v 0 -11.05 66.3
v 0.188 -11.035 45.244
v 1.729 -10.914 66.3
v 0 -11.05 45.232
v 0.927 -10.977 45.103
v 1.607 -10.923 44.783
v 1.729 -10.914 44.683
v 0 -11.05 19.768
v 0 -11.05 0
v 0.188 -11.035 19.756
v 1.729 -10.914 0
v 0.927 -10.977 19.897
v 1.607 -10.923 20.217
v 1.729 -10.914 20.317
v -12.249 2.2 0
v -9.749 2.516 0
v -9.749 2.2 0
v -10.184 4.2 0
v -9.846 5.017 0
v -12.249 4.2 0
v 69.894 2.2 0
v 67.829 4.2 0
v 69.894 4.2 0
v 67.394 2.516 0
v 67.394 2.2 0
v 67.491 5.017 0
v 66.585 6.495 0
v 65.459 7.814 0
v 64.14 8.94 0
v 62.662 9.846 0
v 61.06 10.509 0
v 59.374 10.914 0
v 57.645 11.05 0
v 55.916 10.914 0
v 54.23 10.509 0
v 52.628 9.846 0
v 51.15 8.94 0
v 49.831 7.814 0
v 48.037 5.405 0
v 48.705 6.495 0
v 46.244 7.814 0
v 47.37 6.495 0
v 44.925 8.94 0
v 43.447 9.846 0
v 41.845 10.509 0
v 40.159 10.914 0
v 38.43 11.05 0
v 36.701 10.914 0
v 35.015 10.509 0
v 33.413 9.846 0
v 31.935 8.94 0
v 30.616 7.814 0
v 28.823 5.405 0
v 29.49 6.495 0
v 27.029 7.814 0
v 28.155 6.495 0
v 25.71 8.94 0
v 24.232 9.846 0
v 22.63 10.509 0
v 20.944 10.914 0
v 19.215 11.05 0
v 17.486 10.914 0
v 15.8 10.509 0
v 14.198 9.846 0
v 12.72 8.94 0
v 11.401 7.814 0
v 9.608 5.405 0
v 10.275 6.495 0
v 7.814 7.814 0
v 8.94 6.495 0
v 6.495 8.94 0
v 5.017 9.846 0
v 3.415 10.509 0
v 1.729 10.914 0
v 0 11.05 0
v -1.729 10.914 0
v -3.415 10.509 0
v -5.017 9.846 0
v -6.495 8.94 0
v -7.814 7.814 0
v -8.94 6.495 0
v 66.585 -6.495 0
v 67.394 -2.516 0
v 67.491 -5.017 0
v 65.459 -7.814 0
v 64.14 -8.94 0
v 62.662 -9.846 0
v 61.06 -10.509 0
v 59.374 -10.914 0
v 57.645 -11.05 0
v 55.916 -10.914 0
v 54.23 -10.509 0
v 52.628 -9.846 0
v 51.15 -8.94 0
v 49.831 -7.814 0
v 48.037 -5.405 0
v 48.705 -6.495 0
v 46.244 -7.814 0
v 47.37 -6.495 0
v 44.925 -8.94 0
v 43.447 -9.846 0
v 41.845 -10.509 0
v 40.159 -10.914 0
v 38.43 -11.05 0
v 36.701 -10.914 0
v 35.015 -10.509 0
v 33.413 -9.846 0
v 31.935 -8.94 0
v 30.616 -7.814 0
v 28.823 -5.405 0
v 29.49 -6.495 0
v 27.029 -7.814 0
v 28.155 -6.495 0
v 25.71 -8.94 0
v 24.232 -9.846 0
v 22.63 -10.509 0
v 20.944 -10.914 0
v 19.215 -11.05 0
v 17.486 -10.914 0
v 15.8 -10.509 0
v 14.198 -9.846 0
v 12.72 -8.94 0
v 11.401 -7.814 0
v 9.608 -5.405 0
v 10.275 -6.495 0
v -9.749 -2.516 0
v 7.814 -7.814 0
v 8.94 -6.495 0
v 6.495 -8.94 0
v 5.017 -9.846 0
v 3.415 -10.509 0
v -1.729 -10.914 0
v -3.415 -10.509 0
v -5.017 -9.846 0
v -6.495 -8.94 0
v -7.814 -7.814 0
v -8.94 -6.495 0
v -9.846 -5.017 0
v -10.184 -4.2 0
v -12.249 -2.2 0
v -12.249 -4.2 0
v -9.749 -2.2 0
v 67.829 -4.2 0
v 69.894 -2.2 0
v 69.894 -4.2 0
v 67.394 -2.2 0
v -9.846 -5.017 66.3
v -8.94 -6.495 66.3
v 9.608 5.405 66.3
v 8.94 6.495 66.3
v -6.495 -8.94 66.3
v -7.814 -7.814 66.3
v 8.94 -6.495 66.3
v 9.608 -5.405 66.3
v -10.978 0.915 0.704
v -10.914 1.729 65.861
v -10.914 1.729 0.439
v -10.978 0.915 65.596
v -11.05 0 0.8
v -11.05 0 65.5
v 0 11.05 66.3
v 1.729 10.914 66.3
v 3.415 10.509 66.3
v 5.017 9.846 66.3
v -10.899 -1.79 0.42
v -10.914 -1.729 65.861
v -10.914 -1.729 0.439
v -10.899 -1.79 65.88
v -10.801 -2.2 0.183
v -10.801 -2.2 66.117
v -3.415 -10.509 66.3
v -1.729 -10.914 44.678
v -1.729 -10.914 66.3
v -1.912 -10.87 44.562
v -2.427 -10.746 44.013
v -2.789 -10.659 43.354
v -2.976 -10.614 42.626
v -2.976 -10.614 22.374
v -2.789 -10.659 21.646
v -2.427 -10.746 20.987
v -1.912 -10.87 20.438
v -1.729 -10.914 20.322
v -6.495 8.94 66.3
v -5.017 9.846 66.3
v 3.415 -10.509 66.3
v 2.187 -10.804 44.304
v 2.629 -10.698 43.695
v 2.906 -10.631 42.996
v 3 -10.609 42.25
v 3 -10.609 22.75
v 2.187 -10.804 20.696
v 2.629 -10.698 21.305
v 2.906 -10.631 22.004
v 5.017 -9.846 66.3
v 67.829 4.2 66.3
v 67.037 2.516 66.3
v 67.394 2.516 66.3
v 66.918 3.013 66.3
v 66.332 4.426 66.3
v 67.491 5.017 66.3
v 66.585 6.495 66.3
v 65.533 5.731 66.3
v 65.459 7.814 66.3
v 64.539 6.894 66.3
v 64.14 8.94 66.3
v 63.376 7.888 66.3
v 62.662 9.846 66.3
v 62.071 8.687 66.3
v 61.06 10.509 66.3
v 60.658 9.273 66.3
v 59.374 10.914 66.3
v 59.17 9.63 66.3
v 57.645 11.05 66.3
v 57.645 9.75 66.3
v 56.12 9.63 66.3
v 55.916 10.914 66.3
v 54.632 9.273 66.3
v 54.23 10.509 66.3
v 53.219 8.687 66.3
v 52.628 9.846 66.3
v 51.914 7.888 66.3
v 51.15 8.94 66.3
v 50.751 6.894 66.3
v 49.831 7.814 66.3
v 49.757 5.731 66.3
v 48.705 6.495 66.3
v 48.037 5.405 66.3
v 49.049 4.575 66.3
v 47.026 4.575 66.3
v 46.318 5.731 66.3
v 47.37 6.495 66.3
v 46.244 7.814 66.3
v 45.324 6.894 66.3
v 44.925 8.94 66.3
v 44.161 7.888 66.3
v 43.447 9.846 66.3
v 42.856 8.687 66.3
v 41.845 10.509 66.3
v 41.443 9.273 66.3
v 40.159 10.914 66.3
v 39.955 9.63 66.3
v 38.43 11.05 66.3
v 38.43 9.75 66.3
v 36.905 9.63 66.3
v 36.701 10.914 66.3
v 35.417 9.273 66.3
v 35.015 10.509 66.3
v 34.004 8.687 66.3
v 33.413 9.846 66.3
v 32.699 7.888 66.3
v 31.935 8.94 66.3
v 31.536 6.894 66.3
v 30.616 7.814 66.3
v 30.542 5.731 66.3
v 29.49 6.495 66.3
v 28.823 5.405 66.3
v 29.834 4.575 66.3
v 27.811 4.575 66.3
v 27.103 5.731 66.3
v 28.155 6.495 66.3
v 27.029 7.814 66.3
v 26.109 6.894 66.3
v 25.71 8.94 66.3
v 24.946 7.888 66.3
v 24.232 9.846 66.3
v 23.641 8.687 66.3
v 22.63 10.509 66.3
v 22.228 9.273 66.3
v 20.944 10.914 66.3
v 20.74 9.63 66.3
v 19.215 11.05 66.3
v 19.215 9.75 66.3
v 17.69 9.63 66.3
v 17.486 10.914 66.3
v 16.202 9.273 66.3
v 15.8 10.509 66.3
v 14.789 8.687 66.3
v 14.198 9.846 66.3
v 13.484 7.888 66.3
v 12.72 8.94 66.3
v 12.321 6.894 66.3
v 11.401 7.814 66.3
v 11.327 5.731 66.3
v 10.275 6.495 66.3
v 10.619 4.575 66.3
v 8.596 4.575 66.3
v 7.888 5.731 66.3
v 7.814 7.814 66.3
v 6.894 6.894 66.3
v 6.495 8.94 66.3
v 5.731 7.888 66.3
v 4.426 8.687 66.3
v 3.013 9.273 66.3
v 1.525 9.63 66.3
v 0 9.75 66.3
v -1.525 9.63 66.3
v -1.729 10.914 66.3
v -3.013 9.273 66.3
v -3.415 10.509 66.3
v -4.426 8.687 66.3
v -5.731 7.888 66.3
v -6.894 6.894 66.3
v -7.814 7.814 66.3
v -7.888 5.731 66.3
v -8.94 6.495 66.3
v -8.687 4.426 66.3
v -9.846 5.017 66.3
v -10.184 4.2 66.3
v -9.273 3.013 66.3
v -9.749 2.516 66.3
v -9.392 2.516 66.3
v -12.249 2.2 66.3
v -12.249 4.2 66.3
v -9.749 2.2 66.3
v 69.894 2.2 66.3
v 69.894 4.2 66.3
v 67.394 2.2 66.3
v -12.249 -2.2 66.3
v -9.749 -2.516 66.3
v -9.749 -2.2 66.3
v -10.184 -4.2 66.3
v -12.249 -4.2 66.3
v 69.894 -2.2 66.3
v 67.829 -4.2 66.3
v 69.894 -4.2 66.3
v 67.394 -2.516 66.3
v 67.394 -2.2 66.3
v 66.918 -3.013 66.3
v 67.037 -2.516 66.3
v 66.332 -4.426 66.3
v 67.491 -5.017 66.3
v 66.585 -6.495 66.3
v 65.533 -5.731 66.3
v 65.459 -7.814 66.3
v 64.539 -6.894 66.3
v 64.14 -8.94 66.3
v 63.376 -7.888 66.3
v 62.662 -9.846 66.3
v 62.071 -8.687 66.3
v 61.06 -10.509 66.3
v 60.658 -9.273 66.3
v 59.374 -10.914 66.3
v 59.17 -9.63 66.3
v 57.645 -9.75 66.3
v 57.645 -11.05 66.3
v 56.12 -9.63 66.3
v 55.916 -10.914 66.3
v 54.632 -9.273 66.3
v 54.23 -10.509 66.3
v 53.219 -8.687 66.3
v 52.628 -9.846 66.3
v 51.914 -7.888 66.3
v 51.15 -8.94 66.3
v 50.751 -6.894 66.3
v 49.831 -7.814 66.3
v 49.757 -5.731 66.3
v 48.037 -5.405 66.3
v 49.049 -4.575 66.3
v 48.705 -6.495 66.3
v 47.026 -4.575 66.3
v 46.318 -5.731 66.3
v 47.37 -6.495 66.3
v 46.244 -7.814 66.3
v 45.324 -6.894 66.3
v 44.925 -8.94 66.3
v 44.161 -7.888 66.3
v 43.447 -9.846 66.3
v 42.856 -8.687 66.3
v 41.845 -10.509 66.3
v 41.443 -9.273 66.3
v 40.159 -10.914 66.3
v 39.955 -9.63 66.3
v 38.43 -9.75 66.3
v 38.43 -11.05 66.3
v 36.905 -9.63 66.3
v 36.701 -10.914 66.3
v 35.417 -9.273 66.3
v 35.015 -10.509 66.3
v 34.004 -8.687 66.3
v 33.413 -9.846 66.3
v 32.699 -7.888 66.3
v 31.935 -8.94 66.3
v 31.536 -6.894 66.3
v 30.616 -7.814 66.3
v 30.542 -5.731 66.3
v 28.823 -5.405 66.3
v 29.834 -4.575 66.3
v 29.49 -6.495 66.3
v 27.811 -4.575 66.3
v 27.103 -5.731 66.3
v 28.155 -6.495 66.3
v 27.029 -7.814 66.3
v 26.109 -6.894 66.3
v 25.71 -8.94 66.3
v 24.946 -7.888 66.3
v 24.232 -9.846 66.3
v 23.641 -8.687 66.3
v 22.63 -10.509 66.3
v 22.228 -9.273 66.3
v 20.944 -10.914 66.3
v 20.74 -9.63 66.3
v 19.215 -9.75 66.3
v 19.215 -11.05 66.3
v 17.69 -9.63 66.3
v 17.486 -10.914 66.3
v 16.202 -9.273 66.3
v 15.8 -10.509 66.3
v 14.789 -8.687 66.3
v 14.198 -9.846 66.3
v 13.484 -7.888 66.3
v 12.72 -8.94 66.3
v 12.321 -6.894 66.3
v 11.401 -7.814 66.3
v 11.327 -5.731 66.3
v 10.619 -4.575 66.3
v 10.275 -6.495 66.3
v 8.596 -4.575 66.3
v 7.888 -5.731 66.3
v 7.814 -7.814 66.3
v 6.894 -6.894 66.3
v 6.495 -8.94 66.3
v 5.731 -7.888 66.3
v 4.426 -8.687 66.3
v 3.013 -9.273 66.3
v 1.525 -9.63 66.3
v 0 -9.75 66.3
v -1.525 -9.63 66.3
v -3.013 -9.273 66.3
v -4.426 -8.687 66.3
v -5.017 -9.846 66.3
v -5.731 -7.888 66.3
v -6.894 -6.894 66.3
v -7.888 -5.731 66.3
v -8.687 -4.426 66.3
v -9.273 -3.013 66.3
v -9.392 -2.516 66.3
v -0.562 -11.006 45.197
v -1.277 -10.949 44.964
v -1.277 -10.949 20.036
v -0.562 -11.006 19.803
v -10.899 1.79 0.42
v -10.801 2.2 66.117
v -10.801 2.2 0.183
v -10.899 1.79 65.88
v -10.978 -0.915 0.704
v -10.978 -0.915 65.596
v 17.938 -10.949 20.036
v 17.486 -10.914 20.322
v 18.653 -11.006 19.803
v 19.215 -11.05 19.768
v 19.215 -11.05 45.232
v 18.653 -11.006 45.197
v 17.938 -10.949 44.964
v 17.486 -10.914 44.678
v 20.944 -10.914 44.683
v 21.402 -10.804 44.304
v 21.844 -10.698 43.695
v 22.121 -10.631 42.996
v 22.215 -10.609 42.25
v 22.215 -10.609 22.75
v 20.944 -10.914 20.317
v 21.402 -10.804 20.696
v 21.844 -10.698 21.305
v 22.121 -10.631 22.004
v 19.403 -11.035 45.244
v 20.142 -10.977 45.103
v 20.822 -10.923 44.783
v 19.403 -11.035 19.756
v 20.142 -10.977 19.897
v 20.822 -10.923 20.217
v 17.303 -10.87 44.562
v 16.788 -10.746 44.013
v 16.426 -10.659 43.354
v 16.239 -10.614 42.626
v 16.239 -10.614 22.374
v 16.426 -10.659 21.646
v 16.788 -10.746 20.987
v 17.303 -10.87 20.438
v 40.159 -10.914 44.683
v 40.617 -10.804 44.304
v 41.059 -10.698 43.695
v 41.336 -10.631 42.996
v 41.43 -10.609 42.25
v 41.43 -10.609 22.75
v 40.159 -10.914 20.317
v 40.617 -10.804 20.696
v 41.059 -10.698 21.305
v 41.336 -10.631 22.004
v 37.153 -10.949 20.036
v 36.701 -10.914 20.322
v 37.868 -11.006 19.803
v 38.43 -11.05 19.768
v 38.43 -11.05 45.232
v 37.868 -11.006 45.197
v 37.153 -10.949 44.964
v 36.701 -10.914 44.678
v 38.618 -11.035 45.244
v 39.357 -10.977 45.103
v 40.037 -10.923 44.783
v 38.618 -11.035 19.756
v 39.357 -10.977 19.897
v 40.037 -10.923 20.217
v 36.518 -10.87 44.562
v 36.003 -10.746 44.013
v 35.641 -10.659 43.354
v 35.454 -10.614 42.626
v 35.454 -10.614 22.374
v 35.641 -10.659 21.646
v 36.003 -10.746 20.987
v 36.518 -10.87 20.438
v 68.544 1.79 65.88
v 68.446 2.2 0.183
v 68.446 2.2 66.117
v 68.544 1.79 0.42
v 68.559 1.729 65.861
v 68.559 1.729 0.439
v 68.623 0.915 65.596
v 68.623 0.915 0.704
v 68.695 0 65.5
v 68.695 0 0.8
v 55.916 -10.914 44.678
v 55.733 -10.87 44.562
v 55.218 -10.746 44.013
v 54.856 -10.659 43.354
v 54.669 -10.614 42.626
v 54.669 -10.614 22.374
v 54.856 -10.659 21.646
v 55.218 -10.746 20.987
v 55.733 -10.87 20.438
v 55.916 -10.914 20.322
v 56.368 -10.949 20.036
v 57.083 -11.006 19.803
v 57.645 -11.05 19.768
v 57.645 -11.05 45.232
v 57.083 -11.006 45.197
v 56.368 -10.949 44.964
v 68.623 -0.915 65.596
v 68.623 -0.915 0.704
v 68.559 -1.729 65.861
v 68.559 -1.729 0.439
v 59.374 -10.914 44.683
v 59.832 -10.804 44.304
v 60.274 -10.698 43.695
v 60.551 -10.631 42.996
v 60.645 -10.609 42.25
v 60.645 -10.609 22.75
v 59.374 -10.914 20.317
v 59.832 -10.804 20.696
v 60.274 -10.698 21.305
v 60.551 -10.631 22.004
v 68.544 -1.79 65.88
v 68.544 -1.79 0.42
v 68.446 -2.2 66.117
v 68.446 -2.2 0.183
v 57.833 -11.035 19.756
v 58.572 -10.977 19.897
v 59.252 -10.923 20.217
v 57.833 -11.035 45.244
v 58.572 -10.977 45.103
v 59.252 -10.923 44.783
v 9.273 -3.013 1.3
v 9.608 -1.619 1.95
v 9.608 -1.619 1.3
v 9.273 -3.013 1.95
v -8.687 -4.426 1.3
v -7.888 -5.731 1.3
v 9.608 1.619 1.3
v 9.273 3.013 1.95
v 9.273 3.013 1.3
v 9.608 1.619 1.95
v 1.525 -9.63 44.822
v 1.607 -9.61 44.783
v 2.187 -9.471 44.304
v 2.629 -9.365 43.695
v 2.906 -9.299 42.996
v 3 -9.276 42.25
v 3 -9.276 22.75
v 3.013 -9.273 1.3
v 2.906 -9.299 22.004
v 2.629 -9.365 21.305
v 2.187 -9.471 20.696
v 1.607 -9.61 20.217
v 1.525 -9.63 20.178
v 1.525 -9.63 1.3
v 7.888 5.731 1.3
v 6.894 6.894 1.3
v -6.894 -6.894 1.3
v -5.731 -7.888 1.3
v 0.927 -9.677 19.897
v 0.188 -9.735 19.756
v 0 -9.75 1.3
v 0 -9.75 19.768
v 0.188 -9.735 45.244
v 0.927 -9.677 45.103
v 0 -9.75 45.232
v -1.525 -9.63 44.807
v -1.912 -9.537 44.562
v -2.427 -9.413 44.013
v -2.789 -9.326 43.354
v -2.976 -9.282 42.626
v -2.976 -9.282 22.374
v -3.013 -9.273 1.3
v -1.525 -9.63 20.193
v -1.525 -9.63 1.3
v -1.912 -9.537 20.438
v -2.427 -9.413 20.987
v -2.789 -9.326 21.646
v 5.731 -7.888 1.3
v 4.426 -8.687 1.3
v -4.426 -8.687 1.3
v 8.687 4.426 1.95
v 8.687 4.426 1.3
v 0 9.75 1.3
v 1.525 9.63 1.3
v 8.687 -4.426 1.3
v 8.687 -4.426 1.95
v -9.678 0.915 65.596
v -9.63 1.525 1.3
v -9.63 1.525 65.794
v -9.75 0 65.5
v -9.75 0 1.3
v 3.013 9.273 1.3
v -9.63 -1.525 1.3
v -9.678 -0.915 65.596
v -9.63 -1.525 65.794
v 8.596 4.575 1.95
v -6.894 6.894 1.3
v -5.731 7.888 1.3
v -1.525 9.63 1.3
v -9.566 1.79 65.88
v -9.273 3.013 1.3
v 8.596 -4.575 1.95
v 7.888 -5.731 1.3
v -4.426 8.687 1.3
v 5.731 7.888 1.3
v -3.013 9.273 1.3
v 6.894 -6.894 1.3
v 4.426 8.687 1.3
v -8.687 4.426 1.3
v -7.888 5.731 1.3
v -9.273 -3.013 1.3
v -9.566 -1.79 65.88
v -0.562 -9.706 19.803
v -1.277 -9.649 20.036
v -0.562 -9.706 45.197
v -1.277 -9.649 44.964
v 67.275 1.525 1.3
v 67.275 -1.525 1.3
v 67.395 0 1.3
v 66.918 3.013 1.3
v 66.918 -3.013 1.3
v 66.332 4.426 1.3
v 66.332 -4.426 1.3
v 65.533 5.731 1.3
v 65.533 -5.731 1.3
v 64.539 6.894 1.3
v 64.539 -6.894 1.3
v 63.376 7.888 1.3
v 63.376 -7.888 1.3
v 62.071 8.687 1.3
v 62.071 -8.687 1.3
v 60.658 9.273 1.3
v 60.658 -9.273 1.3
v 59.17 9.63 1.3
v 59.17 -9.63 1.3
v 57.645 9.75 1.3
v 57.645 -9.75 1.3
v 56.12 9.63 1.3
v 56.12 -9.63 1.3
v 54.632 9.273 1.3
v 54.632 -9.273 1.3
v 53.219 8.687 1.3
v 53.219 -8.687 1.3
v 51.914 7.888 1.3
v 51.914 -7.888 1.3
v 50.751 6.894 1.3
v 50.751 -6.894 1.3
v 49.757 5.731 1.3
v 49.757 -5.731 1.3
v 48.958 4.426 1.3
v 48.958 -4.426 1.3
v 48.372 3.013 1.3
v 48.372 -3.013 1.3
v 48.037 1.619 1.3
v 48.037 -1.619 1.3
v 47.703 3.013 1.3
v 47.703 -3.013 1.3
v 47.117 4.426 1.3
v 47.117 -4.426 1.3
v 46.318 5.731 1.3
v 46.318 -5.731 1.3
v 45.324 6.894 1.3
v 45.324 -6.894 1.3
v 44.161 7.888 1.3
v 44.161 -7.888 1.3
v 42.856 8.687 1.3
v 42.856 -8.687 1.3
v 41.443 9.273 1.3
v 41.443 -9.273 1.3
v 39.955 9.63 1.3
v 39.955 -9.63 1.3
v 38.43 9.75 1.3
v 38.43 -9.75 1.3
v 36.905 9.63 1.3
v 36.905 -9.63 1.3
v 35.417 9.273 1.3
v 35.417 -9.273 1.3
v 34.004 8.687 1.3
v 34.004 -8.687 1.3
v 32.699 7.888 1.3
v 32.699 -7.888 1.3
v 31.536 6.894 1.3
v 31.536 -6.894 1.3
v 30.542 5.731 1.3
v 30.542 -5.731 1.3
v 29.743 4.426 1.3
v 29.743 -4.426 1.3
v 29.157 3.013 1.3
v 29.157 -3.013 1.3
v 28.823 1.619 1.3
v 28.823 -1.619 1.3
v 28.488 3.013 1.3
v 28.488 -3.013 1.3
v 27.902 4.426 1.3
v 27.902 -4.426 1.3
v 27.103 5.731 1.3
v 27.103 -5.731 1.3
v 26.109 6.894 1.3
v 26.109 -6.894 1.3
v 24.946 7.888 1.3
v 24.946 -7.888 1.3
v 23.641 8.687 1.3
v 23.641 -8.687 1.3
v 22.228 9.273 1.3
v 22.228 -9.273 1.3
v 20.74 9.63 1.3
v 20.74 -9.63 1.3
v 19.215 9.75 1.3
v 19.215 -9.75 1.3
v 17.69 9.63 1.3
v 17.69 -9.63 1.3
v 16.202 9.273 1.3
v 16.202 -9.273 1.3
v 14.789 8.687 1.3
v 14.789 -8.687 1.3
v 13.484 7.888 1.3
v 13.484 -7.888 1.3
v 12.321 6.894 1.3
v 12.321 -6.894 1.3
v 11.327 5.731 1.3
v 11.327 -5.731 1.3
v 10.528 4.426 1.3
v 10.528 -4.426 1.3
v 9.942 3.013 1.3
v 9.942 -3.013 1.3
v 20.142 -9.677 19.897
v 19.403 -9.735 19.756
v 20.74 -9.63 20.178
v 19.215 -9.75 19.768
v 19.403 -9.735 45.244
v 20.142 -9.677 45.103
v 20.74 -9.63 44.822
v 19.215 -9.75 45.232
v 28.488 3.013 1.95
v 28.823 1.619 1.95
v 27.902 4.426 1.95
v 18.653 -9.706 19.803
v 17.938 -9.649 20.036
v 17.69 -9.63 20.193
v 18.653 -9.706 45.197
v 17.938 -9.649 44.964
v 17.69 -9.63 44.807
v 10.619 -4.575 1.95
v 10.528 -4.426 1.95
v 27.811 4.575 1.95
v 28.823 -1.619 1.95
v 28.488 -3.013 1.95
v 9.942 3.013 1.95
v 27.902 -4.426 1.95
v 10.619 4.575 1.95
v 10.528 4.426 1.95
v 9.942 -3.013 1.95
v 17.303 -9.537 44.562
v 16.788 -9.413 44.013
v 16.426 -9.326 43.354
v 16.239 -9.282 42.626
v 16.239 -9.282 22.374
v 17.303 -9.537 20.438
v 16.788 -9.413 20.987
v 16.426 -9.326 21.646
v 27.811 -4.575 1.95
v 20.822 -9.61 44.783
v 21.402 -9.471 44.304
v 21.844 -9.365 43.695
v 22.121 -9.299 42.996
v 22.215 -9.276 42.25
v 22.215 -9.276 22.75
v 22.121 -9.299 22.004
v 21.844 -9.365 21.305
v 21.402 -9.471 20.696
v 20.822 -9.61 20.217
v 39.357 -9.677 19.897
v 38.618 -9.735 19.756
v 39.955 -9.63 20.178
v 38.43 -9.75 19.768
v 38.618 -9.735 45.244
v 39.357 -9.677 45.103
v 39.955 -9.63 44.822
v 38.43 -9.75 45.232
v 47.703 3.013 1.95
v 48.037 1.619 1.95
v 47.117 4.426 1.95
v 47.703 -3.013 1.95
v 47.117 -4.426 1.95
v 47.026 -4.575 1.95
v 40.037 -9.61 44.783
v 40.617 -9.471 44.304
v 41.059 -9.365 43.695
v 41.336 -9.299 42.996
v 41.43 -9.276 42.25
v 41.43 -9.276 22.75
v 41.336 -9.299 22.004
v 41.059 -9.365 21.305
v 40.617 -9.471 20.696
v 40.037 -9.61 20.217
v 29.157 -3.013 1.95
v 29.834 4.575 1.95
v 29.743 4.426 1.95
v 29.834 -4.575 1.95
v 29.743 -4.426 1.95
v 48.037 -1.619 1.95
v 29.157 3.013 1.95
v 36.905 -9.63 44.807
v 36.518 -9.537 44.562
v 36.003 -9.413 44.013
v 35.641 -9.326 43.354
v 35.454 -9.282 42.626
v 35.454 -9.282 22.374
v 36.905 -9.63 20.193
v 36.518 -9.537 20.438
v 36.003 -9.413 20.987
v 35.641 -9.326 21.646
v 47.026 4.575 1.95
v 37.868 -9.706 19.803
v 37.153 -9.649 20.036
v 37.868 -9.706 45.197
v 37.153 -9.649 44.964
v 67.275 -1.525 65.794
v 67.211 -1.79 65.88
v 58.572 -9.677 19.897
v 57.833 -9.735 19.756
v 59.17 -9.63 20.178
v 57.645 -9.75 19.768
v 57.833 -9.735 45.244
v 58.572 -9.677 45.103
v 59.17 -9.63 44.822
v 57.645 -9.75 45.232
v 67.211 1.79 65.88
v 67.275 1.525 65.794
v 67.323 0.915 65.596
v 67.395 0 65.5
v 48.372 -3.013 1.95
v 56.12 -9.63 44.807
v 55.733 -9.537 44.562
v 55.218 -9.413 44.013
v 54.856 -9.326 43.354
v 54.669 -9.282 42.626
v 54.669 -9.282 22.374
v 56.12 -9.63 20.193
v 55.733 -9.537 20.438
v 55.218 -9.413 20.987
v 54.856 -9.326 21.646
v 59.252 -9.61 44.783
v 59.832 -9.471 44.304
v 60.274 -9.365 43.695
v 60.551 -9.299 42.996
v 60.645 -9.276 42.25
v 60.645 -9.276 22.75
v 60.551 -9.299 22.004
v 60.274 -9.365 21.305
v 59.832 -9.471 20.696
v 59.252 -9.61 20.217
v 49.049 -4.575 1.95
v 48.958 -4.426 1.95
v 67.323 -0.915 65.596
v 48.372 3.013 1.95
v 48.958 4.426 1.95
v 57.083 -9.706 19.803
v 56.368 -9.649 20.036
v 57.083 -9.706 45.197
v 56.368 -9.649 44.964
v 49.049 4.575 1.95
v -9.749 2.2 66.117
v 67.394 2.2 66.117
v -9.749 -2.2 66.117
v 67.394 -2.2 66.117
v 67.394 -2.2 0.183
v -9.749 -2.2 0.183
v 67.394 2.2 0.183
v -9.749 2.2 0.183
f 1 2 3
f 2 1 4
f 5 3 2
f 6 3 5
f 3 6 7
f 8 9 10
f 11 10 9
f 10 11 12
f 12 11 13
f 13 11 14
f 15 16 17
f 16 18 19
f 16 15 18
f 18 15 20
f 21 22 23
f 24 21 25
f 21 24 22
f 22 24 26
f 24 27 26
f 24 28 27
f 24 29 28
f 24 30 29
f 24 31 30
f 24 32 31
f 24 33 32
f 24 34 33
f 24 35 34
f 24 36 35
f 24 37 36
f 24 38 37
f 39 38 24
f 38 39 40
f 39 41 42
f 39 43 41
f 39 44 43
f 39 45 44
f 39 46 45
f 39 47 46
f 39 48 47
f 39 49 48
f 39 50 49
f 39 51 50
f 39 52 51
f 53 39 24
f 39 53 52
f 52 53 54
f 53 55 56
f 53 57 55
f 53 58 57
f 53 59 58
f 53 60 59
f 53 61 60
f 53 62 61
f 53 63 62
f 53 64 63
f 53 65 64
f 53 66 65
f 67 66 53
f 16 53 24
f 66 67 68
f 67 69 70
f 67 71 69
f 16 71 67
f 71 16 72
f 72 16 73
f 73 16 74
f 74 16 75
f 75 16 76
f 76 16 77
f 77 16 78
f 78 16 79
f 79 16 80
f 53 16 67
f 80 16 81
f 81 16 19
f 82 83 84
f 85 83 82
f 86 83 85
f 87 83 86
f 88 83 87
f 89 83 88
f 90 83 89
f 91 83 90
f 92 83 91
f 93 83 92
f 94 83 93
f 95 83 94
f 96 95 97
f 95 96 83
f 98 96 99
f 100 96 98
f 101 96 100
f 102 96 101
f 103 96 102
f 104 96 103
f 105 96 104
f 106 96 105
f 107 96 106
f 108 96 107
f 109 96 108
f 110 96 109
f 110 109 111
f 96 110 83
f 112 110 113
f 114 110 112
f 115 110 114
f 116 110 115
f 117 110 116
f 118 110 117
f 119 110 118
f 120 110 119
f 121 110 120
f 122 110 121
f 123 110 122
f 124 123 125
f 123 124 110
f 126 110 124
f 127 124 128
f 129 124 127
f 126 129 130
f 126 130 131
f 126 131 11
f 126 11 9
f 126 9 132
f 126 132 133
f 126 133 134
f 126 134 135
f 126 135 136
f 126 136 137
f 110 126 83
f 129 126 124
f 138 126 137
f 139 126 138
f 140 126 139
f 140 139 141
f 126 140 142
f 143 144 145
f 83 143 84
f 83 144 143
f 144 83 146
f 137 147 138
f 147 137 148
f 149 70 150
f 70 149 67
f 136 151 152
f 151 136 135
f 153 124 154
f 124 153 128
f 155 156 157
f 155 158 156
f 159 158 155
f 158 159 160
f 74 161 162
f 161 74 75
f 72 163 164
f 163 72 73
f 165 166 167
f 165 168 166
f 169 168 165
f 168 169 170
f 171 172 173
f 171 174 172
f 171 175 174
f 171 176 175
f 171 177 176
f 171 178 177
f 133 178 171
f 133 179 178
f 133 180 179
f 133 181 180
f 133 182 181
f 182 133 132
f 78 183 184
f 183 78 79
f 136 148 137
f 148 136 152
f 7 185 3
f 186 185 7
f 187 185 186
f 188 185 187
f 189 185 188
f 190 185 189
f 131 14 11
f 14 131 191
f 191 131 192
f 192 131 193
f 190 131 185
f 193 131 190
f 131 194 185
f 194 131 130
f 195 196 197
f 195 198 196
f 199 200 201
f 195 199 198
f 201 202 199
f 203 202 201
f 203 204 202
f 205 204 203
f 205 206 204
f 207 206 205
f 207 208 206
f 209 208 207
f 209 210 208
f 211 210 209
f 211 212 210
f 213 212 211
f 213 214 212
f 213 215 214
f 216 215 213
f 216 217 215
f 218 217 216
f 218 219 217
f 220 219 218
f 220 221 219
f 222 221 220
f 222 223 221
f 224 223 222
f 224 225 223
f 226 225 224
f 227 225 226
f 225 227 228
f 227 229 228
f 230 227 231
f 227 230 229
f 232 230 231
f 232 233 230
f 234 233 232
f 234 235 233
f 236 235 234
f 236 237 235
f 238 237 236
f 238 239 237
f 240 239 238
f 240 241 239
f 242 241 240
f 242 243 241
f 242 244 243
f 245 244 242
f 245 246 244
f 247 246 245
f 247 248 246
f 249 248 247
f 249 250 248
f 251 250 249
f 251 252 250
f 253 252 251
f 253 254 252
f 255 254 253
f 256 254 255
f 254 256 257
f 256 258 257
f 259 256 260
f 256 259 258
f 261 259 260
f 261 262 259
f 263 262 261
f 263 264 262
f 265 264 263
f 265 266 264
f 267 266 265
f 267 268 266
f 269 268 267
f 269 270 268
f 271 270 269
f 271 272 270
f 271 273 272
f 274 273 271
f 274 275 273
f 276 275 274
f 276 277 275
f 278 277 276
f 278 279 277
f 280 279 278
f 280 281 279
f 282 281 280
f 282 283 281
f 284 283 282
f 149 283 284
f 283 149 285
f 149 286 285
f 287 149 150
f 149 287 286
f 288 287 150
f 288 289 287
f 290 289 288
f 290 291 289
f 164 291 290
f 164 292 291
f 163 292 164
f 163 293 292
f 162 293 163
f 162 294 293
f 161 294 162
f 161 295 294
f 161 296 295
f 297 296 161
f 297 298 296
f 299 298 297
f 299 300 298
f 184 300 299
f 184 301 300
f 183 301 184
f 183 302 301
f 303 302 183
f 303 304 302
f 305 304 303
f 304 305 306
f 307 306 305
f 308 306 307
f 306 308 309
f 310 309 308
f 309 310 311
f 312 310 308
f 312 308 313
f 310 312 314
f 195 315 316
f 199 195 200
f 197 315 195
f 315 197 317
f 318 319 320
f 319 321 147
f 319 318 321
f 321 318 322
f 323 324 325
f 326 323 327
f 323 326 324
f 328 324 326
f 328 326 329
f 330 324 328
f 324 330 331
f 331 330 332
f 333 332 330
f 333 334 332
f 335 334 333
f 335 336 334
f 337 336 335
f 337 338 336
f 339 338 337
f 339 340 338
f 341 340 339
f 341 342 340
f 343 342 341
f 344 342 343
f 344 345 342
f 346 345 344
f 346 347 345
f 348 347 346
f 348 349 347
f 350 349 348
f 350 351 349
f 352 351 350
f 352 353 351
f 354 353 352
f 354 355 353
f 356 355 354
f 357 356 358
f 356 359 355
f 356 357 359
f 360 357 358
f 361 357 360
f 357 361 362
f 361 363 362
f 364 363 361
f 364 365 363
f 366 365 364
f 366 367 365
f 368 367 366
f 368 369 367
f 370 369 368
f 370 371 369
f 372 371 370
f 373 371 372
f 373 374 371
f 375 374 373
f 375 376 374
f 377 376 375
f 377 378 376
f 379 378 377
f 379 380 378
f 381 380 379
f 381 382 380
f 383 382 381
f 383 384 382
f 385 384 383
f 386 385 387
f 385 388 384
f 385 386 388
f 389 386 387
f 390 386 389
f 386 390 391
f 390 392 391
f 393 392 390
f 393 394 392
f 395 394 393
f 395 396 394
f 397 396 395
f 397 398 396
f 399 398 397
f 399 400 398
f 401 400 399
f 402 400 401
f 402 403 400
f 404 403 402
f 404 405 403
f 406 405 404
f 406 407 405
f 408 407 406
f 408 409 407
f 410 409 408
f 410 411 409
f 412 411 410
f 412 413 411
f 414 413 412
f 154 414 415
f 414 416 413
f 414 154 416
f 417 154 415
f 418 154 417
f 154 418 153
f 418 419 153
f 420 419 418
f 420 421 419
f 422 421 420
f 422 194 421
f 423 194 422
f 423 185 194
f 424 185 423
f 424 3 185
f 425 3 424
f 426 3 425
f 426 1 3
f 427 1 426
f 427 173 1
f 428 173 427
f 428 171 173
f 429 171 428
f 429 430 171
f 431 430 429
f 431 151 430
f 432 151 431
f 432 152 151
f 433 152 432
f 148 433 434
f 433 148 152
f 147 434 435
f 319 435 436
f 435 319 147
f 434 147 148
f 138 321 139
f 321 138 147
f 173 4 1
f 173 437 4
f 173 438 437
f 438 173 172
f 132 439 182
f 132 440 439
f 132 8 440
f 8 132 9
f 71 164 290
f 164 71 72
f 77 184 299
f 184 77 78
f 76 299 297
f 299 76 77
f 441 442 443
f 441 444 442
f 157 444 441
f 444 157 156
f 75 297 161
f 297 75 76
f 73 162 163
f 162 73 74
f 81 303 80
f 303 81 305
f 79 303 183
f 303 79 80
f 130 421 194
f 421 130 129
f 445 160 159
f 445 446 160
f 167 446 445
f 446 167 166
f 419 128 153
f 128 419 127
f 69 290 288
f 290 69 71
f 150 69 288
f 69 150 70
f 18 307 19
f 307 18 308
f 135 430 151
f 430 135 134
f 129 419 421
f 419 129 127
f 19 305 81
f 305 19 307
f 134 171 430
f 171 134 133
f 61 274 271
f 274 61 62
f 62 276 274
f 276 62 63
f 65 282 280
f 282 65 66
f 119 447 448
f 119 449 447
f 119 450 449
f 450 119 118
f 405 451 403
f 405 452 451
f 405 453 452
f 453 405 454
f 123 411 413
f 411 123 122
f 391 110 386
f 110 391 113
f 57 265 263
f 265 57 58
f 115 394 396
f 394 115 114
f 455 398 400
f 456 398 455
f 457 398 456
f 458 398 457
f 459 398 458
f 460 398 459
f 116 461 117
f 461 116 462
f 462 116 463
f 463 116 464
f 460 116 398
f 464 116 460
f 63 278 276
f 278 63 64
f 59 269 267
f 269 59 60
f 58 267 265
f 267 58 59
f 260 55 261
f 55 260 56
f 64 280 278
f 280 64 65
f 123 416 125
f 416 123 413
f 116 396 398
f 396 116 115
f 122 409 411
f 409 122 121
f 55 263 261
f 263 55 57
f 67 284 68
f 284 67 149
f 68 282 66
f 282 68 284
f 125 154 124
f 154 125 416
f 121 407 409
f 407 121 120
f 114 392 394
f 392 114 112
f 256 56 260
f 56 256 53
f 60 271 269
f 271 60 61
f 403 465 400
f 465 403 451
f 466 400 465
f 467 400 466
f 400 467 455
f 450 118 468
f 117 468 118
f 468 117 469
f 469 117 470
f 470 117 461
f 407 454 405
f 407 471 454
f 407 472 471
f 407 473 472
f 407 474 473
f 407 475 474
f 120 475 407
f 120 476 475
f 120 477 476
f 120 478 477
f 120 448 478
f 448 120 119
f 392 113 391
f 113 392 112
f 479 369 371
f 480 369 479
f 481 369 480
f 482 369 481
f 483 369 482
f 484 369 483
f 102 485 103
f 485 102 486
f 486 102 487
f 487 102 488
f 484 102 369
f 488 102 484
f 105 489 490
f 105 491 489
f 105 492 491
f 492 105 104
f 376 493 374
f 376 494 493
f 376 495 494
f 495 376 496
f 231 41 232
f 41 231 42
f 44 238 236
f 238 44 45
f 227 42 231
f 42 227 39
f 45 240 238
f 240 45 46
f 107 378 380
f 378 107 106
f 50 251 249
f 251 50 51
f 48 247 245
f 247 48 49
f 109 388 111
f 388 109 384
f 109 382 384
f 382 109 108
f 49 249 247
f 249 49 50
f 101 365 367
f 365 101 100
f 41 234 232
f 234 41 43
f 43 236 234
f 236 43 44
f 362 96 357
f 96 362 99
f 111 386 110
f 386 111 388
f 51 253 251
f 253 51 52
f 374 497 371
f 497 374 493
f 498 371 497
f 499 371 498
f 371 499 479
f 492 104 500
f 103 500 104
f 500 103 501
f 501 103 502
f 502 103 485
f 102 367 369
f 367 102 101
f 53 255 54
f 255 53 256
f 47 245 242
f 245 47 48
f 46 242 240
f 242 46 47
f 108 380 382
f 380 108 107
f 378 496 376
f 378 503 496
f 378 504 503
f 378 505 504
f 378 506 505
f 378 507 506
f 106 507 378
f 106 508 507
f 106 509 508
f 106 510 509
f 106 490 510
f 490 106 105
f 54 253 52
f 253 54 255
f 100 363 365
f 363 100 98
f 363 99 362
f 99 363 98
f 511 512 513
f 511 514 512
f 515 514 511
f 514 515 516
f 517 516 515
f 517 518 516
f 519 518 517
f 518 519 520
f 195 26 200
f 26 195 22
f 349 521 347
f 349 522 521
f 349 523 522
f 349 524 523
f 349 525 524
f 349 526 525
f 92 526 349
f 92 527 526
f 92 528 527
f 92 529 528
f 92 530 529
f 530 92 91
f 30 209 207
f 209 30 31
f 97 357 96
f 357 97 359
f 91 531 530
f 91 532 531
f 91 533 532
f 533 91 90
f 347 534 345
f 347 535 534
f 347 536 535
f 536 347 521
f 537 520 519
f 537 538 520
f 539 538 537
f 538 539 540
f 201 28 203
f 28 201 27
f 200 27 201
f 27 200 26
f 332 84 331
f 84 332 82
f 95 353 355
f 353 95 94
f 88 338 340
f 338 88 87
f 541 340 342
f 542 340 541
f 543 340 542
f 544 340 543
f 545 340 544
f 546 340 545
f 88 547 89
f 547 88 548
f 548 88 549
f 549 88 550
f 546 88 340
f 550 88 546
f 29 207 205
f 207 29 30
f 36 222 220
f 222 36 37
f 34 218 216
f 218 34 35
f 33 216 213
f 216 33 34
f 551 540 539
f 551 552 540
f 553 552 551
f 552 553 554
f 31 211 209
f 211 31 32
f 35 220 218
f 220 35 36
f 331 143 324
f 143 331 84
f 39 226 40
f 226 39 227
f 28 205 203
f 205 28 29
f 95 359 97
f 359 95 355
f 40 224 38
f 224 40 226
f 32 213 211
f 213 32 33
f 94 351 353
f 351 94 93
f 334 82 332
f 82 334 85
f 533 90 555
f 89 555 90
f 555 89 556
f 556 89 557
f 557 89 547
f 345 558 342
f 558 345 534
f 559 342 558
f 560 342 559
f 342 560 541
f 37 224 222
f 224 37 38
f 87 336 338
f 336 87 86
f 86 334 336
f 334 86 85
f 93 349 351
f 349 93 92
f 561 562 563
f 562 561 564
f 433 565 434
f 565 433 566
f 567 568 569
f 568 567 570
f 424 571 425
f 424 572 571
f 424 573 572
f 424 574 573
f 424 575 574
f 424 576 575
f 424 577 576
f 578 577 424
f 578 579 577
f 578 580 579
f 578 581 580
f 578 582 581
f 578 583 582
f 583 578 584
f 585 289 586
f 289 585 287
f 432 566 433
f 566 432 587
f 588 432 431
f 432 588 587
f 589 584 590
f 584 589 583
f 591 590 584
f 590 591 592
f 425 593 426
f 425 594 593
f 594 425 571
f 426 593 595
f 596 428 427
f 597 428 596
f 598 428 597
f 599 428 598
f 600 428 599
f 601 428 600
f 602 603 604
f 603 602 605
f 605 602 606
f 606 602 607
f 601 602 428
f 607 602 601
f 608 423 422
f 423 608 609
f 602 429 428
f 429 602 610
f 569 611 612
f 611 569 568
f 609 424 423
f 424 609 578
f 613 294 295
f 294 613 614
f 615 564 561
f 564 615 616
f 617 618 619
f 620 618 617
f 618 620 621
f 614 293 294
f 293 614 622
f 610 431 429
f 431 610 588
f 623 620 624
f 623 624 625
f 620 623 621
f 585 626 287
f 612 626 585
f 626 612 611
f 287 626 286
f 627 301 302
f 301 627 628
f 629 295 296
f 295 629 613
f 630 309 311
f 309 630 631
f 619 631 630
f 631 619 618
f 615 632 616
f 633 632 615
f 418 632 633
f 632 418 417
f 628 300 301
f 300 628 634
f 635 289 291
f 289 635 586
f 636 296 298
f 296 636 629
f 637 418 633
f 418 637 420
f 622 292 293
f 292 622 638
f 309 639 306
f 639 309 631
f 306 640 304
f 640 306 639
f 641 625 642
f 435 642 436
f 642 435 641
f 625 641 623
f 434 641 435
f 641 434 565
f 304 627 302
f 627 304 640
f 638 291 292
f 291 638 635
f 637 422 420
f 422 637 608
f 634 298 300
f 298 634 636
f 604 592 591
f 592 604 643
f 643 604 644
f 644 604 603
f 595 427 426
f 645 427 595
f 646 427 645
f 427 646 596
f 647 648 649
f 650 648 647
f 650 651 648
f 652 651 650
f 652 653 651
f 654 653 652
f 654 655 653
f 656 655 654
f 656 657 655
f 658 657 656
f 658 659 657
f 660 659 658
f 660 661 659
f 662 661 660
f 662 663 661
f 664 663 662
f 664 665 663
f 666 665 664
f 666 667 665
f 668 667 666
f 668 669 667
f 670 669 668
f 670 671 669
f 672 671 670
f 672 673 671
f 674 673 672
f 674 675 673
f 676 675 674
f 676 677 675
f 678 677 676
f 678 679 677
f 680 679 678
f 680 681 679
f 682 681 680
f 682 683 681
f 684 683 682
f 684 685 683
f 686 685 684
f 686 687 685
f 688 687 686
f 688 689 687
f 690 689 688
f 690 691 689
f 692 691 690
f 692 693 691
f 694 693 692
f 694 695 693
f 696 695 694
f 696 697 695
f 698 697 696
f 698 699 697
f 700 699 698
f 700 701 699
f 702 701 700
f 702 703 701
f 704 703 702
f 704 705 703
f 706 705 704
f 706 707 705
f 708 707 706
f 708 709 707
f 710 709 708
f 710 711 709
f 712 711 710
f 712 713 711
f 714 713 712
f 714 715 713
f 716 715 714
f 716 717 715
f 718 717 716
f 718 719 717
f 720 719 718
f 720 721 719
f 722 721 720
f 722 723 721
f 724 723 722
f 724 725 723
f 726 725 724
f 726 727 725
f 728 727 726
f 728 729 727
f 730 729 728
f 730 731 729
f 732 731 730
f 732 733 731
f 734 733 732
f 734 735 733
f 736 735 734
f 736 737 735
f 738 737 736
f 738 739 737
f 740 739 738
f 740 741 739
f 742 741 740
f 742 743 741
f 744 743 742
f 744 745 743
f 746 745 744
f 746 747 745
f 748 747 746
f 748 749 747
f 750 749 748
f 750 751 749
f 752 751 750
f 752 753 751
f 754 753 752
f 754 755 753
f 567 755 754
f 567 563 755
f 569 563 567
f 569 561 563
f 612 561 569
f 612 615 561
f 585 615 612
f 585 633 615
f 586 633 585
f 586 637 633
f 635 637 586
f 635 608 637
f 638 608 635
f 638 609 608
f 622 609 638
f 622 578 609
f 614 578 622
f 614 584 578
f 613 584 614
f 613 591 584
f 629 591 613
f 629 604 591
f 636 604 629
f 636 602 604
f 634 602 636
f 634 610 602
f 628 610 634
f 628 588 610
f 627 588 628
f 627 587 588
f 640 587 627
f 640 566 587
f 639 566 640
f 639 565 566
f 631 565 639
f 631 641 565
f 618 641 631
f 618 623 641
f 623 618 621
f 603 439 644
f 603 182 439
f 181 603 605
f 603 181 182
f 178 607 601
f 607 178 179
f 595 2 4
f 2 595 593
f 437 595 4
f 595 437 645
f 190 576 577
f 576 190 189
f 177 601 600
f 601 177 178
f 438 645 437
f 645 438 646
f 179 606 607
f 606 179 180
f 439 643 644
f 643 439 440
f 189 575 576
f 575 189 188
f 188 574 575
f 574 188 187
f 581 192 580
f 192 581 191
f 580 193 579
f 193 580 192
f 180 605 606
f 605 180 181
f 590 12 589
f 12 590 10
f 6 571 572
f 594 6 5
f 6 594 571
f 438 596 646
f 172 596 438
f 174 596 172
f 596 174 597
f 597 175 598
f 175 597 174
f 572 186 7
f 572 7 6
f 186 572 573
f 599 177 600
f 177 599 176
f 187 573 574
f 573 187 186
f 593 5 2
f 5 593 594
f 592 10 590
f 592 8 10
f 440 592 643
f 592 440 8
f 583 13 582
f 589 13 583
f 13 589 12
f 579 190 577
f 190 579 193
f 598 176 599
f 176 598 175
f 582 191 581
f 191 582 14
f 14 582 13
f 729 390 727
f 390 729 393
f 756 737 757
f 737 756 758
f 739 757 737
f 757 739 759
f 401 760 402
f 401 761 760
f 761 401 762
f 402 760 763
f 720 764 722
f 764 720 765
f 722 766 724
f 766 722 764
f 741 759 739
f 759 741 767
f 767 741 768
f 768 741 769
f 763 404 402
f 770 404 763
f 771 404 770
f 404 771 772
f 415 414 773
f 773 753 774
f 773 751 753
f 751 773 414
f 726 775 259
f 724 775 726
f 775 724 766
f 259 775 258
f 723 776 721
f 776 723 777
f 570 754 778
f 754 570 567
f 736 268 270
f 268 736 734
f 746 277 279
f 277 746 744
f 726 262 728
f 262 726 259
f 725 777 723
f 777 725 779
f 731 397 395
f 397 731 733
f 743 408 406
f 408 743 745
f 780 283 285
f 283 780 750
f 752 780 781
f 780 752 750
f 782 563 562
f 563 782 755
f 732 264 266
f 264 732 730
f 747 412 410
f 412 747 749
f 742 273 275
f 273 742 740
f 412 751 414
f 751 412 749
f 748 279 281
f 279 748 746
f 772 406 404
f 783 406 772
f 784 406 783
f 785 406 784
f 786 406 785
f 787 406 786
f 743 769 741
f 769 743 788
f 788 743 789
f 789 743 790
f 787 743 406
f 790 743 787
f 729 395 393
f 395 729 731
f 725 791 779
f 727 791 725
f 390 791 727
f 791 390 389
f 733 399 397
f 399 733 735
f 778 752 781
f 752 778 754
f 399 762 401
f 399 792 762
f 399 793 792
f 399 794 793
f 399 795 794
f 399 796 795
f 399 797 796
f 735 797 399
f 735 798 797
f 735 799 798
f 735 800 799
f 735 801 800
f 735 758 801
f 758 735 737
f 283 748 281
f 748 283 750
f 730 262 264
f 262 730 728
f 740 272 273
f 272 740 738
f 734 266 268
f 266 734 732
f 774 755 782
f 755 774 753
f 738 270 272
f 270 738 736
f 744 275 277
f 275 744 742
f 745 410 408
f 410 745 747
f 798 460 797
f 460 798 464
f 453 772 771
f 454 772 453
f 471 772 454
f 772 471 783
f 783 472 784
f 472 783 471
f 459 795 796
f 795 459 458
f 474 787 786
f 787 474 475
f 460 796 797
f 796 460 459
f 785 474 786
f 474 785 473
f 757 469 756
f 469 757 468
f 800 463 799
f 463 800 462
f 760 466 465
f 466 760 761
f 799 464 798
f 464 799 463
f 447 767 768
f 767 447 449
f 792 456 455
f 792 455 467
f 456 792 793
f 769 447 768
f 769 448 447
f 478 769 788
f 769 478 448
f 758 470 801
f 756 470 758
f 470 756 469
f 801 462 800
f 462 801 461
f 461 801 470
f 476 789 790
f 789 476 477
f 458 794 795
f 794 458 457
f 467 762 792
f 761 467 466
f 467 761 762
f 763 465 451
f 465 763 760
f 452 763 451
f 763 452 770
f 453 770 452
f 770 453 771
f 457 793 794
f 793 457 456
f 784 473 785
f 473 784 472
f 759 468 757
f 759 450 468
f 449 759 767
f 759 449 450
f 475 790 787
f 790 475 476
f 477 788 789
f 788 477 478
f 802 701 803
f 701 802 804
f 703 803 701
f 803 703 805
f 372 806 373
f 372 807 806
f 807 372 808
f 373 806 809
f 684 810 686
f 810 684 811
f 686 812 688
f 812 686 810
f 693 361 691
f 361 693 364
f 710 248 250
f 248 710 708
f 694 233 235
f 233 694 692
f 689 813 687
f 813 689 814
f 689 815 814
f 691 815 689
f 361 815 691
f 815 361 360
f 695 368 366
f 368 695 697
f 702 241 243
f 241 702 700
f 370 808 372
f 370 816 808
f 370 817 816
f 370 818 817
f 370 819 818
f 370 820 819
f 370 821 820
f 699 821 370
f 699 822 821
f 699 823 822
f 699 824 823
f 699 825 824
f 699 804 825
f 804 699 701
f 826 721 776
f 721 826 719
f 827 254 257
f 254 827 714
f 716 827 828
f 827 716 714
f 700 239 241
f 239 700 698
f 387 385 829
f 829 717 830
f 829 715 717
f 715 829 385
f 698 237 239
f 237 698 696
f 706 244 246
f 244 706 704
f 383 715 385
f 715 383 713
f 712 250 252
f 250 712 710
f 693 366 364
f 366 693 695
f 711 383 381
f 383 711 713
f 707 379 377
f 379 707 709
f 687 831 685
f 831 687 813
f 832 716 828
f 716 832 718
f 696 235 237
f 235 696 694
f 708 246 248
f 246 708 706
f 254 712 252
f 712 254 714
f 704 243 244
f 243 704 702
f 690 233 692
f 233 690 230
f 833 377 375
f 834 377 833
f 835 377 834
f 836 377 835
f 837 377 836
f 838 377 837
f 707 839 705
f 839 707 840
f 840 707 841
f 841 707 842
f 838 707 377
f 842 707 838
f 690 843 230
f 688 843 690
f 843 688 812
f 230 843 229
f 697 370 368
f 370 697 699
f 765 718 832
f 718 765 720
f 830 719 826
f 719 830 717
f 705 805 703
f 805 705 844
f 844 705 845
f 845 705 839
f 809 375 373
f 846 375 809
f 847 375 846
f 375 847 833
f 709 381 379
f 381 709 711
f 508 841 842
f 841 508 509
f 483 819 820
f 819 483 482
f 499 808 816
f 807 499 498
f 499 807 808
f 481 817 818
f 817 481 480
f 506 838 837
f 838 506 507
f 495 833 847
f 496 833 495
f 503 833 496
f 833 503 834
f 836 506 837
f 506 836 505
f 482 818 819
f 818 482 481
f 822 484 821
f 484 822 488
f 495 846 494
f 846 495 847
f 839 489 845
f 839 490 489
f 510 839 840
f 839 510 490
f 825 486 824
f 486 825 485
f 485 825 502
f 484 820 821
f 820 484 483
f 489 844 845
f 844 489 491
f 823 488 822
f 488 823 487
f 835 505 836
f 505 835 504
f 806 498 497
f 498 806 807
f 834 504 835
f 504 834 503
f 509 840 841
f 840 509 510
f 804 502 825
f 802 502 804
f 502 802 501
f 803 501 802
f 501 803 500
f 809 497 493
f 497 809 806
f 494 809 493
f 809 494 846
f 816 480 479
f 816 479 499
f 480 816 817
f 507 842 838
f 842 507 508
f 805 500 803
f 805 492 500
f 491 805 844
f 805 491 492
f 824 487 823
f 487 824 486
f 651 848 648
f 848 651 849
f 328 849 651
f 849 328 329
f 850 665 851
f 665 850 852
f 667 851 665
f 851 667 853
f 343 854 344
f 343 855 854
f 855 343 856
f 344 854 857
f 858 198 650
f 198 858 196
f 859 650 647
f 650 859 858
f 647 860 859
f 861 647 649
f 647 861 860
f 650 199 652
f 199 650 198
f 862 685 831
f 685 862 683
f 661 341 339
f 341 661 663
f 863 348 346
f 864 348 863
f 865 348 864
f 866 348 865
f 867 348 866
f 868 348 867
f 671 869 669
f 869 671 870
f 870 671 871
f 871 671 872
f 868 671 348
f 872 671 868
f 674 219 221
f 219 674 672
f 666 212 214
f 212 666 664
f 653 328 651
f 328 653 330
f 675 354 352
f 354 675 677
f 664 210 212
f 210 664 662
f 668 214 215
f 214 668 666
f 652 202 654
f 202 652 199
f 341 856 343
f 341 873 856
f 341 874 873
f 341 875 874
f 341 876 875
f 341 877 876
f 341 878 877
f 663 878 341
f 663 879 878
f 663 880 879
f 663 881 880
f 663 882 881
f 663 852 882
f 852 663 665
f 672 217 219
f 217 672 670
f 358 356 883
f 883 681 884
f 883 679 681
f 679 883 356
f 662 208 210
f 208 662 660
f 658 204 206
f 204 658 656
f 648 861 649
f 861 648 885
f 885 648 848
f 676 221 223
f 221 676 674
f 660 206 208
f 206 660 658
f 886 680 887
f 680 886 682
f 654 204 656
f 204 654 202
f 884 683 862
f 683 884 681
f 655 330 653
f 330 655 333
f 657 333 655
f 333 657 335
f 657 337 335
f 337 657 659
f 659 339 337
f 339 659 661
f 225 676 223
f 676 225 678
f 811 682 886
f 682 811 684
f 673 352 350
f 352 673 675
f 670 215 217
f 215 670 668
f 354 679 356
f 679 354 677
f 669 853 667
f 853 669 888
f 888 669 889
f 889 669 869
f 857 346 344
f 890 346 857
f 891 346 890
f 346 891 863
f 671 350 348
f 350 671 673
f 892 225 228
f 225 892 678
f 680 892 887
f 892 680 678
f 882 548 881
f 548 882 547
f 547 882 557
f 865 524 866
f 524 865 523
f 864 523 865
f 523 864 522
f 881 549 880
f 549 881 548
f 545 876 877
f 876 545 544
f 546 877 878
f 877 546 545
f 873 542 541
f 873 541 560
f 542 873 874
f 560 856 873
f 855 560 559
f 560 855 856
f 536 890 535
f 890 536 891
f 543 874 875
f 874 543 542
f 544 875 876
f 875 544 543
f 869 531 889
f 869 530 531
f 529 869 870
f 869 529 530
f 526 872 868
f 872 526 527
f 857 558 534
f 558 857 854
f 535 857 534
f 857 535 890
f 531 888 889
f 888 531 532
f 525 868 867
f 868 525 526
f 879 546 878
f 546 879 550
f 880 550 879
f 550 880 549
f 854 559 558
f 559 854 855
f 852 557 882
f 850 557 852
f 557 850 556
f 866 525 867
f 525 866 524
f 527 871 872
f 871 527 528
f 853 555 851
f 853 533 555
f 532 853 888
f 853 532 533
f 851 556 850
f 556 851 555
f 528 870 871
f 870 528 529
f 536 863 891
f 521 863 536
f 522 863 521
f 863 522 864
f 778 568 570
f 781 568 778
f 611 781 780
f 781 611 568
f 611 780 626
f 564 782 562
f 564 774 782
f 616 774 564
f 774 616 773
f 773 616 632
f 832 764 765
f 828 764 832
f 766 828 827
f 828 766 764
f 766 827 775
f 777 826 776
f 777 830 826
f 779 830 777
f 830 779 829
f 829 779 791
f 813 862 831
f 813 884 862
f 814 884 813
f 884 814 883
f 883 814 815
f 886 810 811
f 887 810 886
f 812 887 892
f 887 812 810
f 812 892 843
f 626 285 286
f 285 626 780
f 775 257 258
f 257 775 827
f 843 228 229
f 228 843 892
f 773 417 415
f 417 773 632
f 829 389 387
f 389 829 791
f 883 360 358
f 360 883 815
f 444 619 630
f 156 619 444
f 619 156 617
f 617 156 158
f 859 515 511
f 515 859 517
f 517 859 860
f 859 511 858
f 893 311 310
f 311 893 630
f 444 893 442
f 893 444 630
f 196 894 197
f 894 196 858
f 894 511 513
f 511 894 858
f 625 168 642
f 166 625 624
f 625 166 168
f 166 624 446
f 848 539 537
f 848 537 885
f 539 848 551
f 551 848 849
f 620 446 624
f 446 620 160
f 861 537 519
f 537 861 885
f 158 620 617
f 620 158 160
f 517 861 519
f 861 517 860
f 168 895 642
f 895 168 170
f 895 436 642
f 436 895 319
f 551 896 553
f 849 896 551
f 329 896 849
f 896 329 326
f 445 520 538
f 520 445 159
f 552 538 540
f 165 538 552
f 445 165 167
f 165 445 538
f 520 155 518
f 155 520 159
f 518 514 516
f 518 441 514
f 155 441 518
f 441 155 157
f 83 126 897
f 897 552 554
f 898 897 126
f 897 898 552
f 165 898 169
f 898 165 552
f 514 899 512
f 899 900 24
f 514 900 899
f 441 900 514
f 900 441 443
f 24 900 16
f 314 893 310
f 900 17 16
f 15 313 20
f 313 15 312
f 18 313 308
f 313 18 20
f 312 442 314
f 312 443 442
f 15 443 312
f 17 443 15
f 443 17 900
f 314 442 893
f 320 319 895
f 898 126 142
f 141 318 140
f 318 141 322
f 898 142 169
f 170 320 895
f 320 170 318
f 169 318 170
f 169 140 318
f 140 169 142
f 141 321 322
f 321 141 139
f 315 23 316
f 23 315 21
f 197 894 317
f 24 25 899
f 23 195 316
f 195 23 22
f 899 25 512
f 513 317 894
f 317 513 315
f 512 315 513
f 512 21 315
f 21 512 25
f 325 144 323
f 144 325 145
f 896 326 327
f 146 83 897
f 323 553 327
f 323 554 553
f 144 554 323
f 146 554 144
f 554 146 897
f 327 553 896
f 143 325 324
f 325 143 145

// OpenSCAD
//**********************************************
//*    Battery Tray for 4 x AA Cells (Mignon)
//*  Customizable with Thingiverse customizer
//*
//*     Version 2.10.2016 Henning Stöcklein
//*           free for non-commercial use
//*
//* History:
//* 20-DEC-2015: Optional cutout in the middle of each cell to read the battery label
//* 23-DEC-2015: Cell distance factor [%] for extra fat cells
//*                     Optional bottom groove for rubber band
//* 02-OCT-2016: Battery Type selector (d and h joined)
//*                     Custom Cell Type added
//*                     LiIon 18650 and LR44 button cell added
//*                     Height Correction Factor added
//*                     Select Longhole Cutout (none, one side, both sides)
//*                     All numeric parameters customizable with slider controls 
//*                     Added charging cap option (not yet in customizer)
//*
//**********************************************

// What to display?
objects = "TRAY" ; // ["TRAY": Battery tray, "CAP": Charging cap]

// Battery Type
cell_type = "Li-18650" ; // ["A": A Baby, "AA": AA Mignon, "AAA": AAA Micro, "LR44": LR44 button cell, "Li-18650": 18650 LiIon, "Custom": Custom - free]

// Battery cell diameter for "Custom" type
cell_d = 14.1 ;   // [8:0.1:30]

// Battery cell height for "Custom" type
cell_h = 50.0 ;   // [5:0.2:80]

// Radial clearance between cell and wall
gap    = 0.6 ; // [0:0.05:1.5]

// Wall and bottom thickness
wall    = 1.3 ; // [1:0.05:2.5]

// Number of battery cells
numcells = 4 ; // [1:8]

// Cell distance in % of diameter
distance = 105 ; // [95:110]

// Height Correction Factor [%]
h_cor = 100 ; // [90:110]


/* [Longhole Cutout Dimensions] */
// Create longhole view window at half height?
cutoffs = -10 ; // [0:Both sides, -10: Only one side, 100:None]

// View Window Cutout Radius
r_window = 3 ; // [0:0.1:5]

// View Window Cutout Height in %
h_window = 30 ; // [10:60]


/* [Rubber band guide Dimensions] */
// Create guide for rubber band ?
rubberguide = 1 ;  // [0: No, 1: Yes]

// Rubber guide width
guide_w  = 2 ; // [1:0.1:3.5]

// Rubber band width
rubber_w = 4.4  ; // [2:0.1:6]

// Create top groove for rubber band on top ?
rubber_topgroove = 1 ;  // [0: No, 1: Yes]

// Create bottom groove for rubber band on top ?
rubber_botgroove = 1 ;  // [0: No, 1: Yes]

// Groove depth
groove_h = 0.8 ; // [0.0:0.1:2.0]


/* [Charge Cap Dimensions] */
// Cap height
capht = 5 ;  // [3:0.2:15]

// Cap wall and bottom thickness
capwall    = 2.8 ; // [1:0.05:4]

// Cap charge bolt hole diameter
capbolt_d  = 3.5 ; // [2:0.1:4]


//********* end of customizable params ***************

// Select d and h according to selected cell type. Leave "custom" dimensions unchanged...
if (objects == "TRAY") {
  if (cell_type == "A")         tray (25.0, h_cor/100 * 50.0) ;
  if (cell_type == "AA")       tray (14.1, h_cor/100 * 50.0) ;
  if (cell_type == "AAA")      tray (10.4, h_cor/100 * 44.6) ;
  if (cell_type == "LR44")      tray (11.7, h_cor/100 * 5.4) ;
  if (cell_type == "Li-18650") tray (18.3, h_cor/100 * 65.0) ;
  if (cell_type == "Custom")  tray (cell_d, h_cor/100 * cell_h) ;
}

if (objects == "CAP") translate ([0,0,-5]) 
{
  if (cell_type == "A")         chargecap (25.0, capht) ;
  if (cell_type == "AA")       chargecap (14.1, capht) ;
  if (cell_type == "AAA")      chargecap (10.4, capht) ;
  if (cell_type == "LR44")      chargecap (11.7, capht) ;
  if (cell_type == "Li-18650") chargecap (18.3, capht) ;
  if (cell_type == "Custom")  chargecap (cell_d, capht) ;
}


//* Module definition
module tray (cdia, cht)
{
    difference()
    {
        for (i = [0:numcells-1])
            translate ([i*cdia*distance/100,0,0]) 
                cylinder (r=cdia/2 + gap+wall, h=cht+wall, $fn=40) ;
        for (i = [0:numcells-1])
        {
            translate ([i*cdia*distance/100,0,wall]) cylinder (r=cdia/2 + gap, h=cht+wall, $fn=40) ;

            //* Cutout optional longhole window
            if (h_window != 0) hull()
            {
                translate ([i*cdia*distance/100, cutoffs, cht/2+h_window/200*cht]) 
                    rotate ([90,0,0]) cylinder (r=r_window, h=2*cdia, center=true, $fn=25) ;
                translate ([i*cdia*distance/100, cutoffs, cht/2-h_window/200*cht]) 
                    rotate ([90,0,0]) cylinder (r=r_window, h=2*cdia, center=true, $fn=25) ;
            }
            translate ([i*cdia*distance/100,0,wall]) cylinder (r=cdia/2 + gap, h=cht+wall, $fn=40) ;
        }
        translate ([(numcells-1)/2*cdia*distance/100, 0, cht/2+2*wall]) cube ([(numcells-1)*cdia, cdia/2, cht+wall], center=true) ;
        
        if (rubber_topgroove == 1)
          translate ([-cdia-wall, 0, cht+wall+rubber_w-groove_h]) 
             rotate ([0,90,0]) cylinder (r=rubber_w, h=(numcells+1)*cdia, $fn=30) ;

       if (rubber_botgroove == 1)
          translate ([-cdia-wall, 0, -rubber_w+groove_h]) 
             rotate ([0,90,0]) cylinder (r=rubber_w, h=(numcells+1)*cdia, $fn=30) ;
    }   

    if (rubberguide == 1)
    {
        translate ([-cdia*0.53-wall, guide_w/2+rubber_w/2, cht/2+wall/2]) cube ([2.5, guide_w, cht+wall], center=true) ;
        translate ([-cdia*0.53-wall, -guide_w/2-rubber_w/2, cht/2+wall/2]) cube ([2.5, guide_w, cht+wall], center=true) ;
        translate ([(numcells-1)*cdia*distance/100+cdia*0.53+wall, guide_w/2+rubber_w/2, cht/2+wall/2]) cube ([2.5, guide_w, cht+wall], center=true) ;
        translate ([(numcells-1)*cdia*distance/100+cdia*0.53+wall, -guide_w/2-rubber_w/2, cht/2+wall/2]) cube ([2.5, guide_w, cht+wall], center=true) ;
    }
} // module


module chargecap (cdia, cht)
{
    difference()
    {
       union() {
          translate ([0,0,1]) cylinder (r=cdia/2 + gap/2 +2*capwall, h=capht+capwall-1, $fn=40) ;
          translate ([0,0,0]) 
              cylinder (r2=cdia/2+gap/2+2*capwall, r1=cdia/2+gap/2+2*capwall-1, h=1, $fn=40) ;
       }
       translate ([0,0,capwall]) cylinder (r=cdia/2 + gap/2 +capwall, h=capht+0.1, $fn=40) ;

       // M3 thread hole for charge contact
       translate ([0,0,-1]) cylinder (r=capbolt_d/2, 40, $fn=30) ;

       // Slot opening cut
       translate ([0,0,capht/2+capwall]) cube ([50, cdia+wall, capht+0.1], center=true) ;
       translate ([cdia/2+wall+10/2,0,capht/2+capwall]) cube ([10, 50, capht+0.1], center=true) ;
       translate ([-cdia/2-wall-10/2,0,capht/2+capwall]) cube ([10, 50, capht+0.1], center=true) ;
    }
} // module


module battery()
{
    translate ([0,0,wall]) cylinder (r=cdia/2, h=cht, $fn=30) ;
}

// %battery() ;
